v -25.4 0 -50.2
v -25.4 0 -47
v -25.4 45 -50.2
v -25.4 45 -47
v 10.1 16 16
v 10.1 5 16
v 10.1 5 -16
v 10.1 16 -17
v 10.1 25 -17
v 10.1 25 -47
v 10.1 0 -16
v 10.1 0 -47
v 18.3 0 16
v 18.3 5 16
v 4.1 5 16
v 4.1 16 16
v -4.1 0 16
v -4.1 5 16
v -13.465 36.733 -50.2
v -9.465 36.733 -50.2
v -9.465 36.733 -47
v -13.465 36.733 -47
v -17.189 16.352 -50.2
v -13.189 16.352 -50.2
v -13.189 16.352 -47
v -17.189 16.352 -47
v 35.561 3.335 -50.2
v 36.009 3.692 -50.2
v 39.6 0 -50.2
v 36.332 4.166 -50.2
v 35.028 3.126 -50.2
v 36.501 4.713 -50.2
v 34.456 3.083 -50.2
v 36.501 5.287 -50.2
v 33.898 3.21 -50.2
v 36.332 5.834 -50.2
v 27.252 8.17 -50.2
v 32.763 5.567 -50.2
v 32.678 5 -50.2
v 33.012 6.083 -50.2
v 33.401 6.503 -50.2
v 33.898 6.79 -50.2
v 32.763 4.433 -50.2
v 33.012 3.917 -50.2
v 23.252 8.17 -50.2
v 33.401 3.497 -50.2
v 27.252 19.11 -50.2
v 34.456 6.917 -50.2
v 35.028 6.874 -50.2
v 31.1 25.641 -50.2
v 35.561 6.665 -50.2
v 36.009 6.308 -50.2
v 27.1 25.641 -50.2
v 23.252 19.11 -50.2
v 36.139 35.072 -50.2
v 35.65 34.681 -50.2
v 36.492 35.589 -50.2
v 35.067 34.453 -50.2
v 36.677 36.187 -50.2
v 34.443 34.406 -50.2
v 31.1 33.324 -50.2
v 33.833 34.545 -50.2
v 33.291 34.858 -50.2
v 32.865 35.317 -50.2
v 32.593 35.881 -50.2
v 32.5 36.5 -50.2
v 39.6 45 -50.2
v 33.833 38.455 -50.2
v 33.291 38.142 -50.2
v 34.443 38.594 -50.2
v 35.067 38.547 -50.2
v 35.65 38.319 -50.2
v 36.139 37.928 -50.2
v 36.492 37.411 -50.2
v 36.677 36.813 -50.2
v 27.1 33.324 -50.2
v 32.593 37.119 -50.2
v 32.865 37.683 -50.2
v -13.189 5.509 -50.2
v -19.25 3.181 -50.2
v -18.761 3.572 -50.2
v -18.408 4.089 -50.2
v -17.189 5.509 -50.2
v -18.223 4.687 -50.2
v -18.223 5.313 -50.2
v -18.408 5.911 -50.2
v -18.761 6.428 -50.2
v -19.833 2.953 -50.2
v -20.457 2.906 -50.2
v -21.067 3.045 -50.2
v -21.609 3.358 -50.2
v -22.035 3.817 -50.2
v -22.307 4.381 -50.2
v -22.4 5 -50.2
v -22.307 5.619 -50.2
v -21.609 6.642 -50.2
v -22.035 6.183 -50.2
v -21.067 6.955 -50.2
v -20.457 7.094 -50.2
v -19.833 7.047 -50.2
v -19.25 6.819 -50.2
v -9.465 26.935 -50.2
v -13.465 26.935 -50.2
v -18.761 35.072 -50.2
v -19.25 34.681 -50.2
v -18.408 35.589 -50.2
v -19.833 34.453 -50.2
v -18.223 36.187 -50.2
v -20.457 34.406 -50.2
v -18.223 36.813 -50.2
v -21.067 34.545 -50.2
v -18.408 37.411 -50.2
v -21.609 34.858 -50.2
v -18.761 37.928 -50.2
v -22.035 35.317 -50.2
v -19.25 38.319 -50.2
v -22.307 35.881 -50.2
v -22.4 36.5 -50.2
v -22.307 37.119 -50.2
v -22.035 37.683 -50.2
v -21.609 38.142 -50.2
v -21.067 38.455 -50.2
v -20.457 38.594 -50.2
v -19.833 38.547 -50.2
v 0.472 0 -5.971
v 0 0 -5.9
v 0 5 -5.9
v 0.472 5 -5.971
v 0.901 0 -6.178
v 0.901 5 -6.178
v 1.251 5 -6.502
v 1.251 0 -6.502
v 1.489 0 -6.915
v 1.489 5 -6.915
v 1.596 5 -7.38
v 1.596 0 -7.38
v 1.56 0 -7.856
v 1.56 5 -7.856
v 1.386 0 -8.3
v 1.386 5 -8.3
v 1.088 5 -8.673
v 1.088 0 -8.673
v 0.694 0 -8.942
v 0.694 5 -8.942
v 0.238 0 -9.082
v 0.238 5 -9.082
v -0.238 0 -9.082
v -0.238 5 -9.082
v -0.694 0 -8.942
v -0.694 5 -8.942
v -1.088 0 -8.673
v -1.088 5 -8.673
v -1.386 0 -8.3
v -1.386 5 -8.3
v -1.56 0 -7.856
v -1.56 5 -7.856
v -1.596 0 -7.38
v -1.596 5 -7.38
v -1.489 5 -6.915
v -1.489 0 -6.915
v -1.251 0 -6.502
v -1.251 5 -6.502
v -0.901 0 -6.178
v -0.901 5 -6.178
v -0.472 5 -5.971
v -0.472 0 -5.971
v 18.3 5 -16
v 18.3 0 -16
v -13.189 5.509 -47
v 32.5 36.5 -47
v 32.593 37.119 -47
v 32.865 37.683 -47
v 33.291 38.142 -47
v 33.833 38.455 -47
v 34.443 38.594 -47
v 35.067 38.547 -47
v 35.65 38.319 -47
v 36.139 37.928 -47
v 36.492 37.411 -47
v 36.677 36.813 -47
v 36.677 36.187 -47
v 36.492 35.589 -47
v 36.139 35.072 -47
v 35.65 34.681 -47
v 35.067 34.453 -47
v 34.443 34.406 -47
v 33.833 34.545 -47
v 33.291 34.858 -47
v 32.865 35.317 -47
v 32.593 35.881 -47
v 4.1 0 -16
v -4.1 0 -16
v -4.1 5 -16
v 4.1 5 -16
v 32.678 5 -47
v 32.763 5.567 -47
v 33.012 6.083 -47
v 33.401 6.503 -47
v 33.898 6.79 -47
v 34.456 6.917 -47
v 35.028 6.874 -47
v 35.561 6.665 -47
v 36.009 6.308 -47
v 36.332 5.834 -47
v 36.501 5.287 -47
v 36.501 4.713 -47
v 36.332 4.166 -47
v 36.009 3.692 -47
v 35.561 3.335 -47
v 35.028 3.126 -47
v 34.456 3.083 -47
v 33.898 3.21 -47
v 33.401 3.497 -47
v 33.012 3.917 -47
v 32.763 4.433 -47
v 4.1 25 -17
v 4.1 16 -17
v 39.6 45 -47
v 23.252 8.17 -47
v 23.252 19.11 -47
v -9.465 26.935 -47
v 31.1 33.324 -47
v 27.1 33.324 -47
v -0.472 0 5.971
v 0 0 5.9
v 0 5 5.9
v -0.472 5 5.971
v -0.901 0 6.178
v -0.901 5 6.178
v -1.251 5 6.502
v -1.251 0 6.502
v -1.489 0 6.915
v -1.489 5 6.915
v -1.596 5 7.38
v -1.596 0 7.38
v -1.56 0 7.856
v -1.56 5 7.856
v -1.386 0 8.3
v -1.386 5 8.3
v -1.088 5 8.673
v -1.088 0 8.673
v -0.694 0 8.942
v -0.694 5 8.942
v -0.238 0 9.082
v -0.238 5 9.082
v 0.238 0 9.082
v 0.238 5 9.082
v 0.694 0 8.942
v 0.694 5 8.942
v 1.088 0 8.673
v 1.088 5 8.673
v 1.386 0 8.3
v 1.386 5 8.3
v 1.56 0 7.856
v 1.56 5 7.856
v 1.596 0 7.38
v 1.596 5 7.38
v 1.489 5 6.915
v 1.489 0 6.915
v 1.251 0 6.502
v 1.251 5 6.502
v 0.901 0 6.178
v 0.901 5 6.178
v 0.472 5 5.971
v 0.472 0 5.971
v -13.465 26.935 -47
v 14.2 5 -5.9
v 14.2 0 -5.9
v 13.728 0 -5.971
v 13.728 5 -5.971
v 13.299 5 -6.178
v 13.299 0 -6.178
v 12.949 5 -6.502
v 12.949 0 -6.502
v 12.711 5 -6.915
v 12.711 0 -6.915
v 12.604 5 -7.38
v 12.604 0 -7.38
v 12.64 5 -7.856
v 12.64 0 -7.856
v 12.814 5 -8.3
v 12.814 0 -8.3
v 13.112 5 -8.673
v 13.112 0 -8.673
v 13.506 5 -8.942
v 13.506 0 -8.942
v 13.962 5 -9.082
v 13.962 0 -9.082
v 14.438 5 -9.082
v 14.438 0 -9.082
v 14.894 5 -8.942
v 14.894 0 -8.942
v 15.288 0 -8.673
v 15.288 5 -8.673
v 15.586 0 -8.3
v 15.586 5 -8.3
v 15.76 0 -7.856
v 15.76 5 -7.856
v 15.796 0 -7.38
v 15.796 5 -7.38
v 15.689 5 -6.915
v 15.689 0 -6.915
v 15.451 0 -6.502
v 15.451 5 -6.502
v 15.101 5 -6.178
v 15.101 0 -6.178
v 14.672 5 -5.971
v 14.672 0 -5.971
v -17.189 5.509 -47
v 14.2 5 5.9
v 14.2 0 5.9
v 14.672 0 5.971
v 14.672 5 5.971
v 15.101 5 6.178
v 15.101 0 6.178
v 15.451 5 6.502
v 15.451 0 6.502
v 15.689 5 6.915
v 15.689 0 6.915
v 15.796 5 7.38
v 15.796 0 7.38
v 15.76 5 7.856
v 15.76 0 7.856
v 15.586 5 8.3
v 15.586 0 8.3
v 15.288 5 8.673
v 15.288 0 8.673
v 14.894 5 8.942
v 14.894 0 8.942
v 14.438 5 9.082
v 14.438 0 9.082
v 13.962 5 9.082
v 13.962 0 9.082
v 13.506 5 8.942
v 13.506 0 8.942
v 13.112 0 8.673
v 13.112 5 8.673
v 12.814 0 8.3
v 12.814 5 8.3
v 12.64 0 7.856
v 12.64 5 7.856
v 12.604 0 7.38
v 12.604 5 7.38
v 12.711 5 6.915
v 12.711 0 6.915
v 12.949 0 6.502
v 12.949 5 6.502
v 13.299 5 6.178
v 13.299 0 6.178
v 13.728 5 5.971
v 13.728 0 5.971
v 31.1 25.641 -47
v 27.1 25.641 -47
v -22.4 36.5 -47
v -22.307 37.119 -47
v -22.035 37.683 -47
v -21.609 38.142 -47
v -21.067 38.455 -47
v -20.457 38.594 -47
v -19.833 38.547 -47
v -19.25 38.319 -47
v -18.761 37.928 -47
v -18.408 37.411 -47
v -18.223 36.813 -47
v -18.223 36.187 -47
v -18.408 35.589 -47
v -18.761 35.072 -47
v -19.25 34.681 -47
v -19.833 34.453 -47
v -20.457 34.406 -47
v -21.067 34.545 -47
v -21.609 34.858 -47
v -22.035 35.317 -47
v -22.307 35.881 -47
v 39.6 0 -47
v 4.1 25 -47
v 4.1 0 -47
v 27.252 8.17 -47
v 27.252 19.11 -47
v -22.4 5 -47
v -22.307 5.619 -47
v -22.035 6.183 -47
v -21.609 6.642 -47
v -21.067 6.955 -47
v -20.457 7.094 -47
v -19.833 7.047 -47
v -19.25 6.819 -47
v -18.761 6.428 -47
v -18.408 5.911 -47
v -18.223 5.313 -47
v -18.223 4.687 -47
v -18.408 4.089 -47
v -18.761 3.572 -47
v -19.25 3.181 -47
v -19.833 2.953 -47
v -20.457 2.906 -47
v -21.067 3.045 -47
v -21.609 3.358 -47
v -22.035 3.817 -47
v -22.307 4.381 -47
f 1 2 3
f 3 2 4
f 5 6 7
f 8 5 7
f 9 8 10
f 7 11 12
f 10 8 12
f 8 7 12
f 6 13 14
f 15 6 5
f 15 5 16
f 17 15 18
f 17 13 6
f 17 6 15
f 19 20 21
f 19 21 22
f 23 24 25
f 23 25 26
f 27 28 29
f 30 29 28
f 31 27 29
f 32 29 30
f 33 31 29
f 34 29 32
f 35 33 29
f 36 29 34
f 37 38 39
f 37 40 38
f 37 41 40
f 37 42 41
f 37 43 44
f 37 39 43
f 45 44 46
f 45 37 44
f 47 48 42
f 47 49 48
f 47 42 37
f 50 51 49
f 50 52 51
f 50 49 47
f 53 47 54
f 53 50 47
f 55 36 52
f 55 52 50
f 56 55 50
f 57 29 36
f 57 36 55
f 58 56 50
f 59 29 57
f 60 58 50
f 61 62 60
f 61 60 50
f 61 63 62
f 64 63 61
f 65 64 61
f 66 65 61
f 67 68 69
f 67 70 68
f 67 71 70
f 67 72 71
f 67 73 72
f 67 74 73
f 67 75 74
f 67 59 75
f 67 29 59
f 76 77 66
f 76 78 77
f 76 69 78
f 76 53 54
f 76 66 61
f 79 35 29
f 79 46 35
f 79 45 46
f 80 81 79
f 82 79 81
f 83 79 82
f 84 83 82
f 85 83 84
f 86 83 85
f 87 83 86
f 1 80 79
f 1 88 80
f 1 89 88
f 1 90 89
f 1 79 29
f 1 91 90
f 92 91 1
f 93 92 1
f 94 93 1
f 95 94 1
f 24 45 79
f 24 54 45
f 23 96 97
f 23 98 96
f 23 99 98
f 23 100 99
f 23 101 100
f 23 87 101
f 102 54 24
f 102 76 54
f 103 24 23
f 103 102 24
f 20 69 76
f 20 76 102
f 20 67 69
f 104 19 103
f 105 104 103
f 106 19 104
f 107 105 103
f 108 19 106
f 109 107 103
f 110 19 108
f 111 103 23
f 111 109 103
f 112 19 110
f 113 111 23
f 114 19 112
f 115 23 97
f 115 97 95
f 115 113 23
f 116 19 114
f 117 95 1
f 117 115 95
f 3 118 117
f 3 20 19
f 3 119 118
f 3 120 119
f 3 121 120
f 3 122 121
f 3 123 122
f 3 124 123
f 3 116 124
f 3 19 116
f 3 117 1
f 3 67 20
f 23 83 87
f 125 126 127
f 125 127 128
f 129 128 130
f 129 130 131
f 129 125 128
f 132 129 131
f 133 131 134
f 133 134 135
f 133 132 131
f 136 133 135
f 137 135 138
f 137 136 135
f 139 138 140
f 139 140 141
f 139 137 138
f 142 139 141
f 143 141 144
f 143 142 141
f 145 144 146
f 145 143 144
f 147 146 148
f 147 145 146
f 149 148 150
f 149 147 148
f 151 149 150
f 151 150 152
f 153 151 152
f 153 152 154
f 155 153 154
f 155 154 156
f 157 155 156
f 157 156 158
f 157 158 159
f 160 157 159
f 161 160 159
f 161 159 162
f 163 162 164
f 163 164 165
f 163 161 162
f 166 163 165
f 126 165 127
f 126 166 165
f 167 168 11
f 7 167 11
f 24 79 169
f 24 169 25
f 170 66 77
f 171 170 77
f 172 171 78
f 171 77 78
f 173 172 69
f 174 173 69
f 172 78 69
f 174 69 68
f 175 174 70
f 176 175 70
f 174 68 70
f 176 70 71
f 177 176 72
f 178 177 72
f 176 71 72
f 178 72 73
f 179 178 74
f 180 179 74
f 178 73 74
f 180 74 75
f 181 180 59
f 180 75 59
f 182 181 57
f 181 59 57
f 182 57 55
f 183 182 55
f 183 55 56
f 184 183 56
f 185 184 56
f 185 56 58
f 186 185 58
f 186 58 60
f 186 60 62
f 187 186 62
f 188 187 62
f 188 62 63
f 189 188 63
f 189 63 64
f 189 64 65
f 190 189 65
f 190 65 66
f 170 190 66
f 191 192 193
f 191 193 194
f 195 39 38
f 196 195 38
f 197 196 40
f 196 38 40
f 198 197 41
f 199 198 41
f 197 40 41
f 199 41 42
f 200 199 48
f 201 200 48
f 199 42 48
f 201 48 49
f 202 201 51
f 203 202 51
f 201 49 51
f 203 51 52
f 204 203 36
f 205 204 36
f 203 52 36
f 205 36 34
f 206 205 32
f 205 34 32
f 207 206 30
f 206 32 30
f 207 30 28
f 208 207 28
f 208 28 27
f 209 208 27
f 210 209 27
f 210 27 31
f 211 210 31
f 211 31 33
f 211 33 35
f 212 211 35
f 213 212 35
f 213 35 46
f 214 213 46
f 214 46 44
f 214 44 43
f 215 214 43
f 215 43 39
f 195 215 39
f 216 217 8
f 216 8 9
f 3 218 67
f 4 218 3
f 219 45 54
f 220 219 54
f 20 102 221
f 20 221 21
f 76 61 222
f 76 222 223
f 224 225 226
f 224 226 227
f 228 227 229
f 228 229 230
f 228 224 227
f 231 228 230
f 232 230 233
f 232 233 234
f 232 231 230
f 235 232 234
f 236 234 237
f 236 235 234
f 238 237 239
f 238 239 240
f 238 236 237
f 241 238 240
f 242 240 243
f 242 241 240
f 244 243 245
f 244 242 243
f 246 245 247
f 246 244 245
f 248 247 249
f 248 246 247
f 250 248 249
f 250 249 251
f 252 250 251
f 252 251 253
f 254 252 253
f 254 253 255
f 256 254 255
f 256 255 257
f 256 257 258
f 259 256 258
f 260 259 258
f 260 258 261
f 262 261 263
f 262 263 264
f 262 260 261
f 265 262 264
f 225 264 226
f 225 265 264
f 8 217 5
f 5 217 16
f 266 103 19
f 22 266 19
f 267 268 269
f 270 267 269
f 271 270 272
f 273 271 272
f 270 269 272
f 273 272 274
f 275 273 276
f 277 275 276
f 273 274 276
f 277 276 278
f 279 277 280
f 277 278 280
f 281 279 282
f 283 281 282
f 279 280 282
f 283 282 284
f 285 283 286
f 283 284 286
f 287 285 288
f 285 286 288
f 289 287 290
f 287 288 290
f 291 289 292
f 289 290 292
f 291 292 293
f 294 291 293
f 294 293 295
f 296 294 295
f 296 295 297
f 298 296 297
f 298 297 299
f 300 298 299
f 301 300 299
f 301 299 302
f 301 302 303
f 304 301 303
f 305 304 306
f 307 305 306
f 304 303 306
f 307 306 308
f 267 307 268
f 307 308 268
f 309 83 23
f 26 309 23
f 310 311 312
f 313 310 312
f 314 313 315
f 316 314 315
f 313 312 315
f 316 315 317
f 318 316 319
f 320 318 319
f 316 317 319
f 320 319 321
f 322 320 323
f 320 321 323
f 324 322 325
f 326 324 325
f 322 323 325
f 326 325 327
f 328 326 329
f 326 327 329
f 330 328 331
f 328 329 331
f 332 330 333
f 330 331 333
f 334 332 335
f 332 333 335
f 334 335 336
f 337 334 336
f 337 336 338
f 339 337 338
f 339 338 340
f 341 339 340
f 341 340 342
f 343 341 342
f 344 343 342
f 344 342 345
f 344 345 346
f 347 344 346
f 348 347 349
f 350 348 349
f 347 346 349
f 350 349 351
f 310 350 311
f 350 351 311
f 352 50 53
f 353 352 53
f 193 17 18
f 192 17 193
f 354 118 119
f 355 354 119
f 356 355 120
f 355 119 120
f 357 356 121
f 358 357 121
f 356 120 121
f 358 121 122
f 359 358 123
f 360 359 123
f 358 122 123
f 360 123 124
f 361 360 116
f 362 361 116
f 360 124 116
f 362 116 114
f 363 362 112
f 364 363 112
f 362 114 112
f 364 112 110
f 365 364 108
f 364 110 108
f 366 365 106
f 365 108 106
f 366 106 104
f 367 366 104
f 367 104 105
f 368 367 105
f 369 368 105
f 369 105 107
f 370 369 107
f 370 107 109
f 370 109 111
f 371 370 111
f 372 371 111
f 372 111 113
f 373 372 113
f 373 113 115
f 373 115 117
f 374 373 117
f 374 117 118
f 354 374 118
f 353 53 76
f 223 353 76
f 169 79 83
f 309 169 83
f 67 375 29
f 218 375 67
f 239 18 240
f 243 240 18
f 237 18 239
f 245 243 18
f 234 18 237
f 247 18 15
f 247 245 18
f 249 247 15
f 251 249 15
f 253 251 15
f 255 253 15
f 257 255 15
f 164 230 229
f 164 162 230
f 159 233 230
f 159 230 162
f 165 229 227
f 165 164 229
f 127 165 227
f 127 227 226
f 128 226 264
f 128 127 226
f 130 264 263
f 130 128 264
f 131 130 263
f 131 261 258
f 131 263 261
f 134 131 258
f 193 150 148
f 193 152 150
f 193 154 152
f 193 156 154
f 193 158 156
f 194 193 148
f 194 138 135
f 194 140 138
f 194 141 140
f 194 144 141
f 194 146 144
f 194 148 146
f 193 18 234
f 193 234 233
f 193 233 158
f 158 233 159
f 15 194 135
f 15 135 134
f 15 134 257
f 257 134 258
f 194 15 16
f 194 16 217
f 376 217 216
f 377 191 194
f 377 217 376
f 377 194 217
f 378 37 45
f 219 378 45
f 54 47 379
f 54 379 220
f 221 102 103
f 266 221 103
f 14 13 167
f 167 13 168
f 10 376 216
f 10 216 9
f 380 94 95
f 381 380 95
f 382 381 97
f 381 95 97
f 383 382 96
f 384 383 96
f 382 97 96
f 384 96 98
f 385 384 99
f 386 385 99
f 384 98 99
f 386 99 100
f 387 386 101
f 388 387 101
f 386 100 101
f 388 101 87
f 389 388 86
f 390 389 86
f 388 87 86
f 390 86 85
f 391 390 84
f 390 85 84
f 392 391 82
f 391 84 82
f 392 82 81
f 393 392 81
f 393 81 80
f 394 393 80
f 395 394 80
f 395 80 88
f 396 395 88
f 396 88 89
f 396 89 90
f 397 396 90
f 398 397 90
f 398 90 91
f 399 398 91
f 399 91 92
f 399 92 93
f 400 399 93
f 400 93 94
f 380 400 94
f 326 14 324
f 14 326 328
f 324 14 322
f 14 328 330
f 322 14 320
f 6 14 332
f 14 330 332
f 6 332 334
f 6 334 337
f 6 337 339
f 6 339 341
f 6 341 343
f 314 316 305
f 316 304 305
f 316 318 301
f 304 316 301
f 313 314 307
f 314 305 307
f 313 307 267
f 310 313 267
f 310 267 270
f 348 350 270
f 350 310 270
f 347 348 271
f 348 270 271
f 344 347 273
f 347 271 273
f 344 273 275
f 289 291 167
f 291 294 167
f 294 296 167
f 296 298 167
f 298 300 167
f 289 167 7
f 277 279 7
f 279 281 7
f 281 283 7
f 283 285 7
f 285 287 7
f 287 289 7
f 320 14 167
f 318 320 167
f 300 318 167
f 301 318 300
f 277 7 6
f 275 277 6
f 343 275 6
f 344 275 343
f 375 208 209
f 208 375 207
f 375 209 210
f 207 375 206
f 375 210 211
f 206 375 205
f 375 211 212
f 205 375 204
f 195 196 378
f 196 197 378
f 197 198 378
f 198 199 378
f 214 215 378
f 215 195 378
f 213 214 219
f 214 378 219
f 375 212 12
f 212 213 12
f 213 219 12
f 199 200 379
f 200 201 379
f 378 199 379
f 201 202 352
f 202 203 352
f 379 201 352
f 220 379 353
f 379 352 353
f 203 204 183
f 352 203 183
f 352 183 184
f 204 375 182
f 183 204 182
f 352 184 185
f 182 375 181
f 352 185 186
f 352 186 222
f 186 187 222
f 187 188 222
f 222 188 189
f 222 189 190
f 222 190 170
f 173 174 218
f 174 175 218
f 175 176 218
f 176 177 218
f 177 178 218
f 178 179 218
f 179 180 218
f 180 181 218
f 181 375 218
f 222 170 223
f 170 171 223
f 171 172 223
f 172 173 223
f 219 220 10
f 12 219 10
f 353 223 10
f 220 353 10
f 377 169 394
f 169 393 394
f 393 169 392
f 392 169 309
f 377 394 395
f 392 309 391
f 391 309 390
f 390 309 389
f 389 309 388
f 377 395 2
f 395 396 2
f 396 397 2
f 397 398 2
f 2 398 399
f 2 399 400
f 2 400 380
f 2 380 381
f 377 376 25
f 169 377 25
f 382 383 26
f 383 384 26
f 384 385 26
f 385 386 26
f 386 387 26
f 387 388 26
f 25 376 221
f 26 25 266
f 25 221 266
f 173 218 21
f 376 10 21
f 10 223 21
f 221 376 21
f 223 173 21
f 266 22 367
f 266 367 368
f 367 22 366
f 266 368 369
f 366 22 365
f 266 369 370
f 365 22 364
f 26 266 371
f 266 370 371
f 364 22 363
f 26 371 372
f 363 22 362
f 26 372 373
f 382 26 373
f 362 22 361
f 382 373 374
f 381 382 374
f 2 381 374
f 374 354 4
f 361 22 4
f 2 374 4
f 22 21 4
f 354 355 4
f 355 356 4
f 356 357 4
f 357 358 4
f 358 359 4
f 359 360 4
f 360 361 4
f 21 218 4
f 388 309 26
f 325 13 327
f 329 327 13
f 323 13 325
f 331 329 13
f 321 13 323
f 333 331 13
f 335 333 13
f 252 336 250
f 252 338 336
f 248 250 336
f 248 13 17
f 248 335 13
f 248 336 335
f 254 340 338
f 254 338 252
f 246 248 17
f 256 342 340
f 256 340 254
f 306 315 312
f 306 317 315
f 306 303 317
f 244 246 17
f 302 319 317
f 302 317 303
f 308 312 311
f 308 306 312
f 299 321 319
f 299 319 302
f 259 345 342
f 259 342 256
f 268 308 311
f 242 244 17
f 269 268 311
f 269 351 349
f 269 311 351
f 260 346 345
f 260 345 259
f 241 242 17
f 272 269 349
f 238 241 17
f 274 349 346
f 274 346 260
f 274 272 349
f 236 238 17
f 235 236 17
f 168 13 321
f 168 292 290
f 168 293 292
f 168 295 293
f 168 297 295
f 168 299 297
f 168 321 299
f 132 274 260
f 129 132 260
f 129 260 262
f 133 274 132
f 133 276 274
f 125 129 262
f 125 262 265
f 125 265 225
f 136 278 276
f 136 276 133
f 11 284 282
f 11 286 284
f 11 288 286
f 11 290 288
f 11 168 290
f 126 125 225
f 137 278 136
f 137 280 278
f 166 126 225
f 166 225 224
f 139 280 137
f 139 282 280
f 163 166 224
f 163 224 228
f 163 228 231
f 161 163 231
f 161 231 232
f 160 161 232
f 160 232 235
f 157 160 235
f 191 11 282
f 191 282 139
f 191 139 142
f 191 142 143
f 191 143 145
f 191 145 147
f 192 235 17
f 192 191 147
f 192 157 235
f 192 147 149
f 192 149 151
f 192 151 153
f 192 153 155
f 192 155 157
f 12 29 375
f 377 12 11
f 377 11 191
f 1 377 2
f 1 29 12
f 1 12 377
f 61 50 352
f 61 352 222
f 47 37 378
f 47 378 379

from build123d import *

# Parameters (mm, degrees)
SKETCH_1_W          = 8.2
SKETCH_1_H          = 32
SKETCH_1_R          = 1.6
EXTRUDE_1_DEPTH     = 5
SKETCH_2_W          = 6
SKETCH_2_H          = 63
EXTRUDE_2_DEPTH     = 25
SKETCH_3_W          = 65
SKETCH_3_H          = 45
EXTRUDE_3_DEPTH     = 3.2
SKETCH_4_R          = 1.922469011
SKETCH_4_R_2        = 2.1
CUT_EXTRUDE_1_DEPTH = 13.2
SKETCH_7_W          = 4
SKETCH_7_H          = 7.68275579
SKETCH_7_H_2        = 10.940540448
SKETCH_7_H_3        = 9.798767364
SKETCH_7_H_4        = 10.843668011
CUT_EXTRUDE_2_DEPTH = 13.2
SKETCH_8_W          = 33
SKETCH_8_H          = 9
CUT_EXTRUDE_3_DEPTH = 13.2


with BuildPart() as part:
    # 草图1 → 凸台-拉伸1 (new body)
    with BuildSketch(Plane(origin=(0, 0, 0), x_dir=(1, 0, 0), z_dir=(0, 1, 0))):
        Rectangle(SKETCH_1_W, SKETCH_1_H)
        with Locations(Location((0, 7.5, 0), (0, 0, 270))):
            Circle(SKETCH_1_R, mode=Mode.SUBTRACT)
        with Locations(Location((0, -7.5, 0), (0, 0, 90))):
            Circle(SKETCH_1_R, mode=Mode.SUBTRACT)
    extrude_1 = extrude(amount=EXTRUDE_1_DEPTH)

    # 草图2 → 凸台-拉伸2 (add)
    with BuildSketch(Plane(origin=(0, 0, 0), x_dir=(1, 0, 0), z_dir=(0, 1, 0))):
        with Locations((7.1, 15.5)):
            Rectangle(SKETCH_2_W, SKETCH_2_H)
    extrude(amount=EXTRUDE_2_DEPTH)

    # 草图3 → 凸台-拉伸3 (add)
    with BuildSketch(Plane(origin=(0, 0, -47), x_dir=(-1, 0, 0), z_dir=(0, 0, -1))):
        with Locations((-7.1, 22.5)):
            Rectangle(SKETCH_3_W, SKETCH_3_H)
    extrude(amount=EXTRUDE_3_DEPTH)

    # 草图4 → 切除-拉伸1 (cut)
    with BuildSketch(Plane(origin=(0, 0, -50.2), x_dir=(-1, 0, 0), z_dir=(0, 0, -1))):
        with Locations((-34.6, 5)):
            Circle(SKETCH_4_R)
        with Locations((20.3, 5)):
            Circle(SKETCH_4_R_2)
        with Locations((-34.6, 36.5)):
            Circle(SKETCH_4_R_2)
        with Locations((20.3, 36.5)):
            Circle(SKETCH_4_R_2)
    extrude(amount=-CUT_EXTRUDE_1_DEPTH, mode=Mode.SUBTRACT)

    # 草图7 → 切除-拉伸2 (cut)
    with BuildSketch(Plane(origin=(0, 0, -50.2), x_dir=(-1, 0, 0), z_dir=(0, 0, -1))):
        with Locations((-29.100303776, 29.48244197)):
            Rectangle(SKETCH_7_W, SKETCH_7_H)
        with Locations((-25.252299823, 13.640004416)):
            Rectangle(SKETCH_7_W, SKETCH_7_H_2)
        with Locations((11.465466314, 31.834080816)):
            Rectangle(SKETCH_7_W, SKETCH_7_H_3)
        with Locations((15.188894487, 10.930624409)):
            Rectangle(SKETCH_7_W, SKETCH_7_H_4)
    extrude(amount=-CUT_EXTRUDE_2_DEPTH, mode=Mode.SUBTRACT)

    # 镜向1: 凸台-拉伸1 across plane
    add(extrude_1.mirror(Plane.ZY.offset(-7.1)))

    # 草图8 → 切除-拉伸3 (cut)
    with BuildSketch(Plane.ZY.offset(-4.1)):
        with Locations((-0.5, 20.5)):
            Rectangle(SKETCH_8_W, SKETCH_8_H)
    extrude(amount=-CUT_EXTRUDE_3_DEPTH, mode=Mode.SUBTRACT)


solid = part.part
